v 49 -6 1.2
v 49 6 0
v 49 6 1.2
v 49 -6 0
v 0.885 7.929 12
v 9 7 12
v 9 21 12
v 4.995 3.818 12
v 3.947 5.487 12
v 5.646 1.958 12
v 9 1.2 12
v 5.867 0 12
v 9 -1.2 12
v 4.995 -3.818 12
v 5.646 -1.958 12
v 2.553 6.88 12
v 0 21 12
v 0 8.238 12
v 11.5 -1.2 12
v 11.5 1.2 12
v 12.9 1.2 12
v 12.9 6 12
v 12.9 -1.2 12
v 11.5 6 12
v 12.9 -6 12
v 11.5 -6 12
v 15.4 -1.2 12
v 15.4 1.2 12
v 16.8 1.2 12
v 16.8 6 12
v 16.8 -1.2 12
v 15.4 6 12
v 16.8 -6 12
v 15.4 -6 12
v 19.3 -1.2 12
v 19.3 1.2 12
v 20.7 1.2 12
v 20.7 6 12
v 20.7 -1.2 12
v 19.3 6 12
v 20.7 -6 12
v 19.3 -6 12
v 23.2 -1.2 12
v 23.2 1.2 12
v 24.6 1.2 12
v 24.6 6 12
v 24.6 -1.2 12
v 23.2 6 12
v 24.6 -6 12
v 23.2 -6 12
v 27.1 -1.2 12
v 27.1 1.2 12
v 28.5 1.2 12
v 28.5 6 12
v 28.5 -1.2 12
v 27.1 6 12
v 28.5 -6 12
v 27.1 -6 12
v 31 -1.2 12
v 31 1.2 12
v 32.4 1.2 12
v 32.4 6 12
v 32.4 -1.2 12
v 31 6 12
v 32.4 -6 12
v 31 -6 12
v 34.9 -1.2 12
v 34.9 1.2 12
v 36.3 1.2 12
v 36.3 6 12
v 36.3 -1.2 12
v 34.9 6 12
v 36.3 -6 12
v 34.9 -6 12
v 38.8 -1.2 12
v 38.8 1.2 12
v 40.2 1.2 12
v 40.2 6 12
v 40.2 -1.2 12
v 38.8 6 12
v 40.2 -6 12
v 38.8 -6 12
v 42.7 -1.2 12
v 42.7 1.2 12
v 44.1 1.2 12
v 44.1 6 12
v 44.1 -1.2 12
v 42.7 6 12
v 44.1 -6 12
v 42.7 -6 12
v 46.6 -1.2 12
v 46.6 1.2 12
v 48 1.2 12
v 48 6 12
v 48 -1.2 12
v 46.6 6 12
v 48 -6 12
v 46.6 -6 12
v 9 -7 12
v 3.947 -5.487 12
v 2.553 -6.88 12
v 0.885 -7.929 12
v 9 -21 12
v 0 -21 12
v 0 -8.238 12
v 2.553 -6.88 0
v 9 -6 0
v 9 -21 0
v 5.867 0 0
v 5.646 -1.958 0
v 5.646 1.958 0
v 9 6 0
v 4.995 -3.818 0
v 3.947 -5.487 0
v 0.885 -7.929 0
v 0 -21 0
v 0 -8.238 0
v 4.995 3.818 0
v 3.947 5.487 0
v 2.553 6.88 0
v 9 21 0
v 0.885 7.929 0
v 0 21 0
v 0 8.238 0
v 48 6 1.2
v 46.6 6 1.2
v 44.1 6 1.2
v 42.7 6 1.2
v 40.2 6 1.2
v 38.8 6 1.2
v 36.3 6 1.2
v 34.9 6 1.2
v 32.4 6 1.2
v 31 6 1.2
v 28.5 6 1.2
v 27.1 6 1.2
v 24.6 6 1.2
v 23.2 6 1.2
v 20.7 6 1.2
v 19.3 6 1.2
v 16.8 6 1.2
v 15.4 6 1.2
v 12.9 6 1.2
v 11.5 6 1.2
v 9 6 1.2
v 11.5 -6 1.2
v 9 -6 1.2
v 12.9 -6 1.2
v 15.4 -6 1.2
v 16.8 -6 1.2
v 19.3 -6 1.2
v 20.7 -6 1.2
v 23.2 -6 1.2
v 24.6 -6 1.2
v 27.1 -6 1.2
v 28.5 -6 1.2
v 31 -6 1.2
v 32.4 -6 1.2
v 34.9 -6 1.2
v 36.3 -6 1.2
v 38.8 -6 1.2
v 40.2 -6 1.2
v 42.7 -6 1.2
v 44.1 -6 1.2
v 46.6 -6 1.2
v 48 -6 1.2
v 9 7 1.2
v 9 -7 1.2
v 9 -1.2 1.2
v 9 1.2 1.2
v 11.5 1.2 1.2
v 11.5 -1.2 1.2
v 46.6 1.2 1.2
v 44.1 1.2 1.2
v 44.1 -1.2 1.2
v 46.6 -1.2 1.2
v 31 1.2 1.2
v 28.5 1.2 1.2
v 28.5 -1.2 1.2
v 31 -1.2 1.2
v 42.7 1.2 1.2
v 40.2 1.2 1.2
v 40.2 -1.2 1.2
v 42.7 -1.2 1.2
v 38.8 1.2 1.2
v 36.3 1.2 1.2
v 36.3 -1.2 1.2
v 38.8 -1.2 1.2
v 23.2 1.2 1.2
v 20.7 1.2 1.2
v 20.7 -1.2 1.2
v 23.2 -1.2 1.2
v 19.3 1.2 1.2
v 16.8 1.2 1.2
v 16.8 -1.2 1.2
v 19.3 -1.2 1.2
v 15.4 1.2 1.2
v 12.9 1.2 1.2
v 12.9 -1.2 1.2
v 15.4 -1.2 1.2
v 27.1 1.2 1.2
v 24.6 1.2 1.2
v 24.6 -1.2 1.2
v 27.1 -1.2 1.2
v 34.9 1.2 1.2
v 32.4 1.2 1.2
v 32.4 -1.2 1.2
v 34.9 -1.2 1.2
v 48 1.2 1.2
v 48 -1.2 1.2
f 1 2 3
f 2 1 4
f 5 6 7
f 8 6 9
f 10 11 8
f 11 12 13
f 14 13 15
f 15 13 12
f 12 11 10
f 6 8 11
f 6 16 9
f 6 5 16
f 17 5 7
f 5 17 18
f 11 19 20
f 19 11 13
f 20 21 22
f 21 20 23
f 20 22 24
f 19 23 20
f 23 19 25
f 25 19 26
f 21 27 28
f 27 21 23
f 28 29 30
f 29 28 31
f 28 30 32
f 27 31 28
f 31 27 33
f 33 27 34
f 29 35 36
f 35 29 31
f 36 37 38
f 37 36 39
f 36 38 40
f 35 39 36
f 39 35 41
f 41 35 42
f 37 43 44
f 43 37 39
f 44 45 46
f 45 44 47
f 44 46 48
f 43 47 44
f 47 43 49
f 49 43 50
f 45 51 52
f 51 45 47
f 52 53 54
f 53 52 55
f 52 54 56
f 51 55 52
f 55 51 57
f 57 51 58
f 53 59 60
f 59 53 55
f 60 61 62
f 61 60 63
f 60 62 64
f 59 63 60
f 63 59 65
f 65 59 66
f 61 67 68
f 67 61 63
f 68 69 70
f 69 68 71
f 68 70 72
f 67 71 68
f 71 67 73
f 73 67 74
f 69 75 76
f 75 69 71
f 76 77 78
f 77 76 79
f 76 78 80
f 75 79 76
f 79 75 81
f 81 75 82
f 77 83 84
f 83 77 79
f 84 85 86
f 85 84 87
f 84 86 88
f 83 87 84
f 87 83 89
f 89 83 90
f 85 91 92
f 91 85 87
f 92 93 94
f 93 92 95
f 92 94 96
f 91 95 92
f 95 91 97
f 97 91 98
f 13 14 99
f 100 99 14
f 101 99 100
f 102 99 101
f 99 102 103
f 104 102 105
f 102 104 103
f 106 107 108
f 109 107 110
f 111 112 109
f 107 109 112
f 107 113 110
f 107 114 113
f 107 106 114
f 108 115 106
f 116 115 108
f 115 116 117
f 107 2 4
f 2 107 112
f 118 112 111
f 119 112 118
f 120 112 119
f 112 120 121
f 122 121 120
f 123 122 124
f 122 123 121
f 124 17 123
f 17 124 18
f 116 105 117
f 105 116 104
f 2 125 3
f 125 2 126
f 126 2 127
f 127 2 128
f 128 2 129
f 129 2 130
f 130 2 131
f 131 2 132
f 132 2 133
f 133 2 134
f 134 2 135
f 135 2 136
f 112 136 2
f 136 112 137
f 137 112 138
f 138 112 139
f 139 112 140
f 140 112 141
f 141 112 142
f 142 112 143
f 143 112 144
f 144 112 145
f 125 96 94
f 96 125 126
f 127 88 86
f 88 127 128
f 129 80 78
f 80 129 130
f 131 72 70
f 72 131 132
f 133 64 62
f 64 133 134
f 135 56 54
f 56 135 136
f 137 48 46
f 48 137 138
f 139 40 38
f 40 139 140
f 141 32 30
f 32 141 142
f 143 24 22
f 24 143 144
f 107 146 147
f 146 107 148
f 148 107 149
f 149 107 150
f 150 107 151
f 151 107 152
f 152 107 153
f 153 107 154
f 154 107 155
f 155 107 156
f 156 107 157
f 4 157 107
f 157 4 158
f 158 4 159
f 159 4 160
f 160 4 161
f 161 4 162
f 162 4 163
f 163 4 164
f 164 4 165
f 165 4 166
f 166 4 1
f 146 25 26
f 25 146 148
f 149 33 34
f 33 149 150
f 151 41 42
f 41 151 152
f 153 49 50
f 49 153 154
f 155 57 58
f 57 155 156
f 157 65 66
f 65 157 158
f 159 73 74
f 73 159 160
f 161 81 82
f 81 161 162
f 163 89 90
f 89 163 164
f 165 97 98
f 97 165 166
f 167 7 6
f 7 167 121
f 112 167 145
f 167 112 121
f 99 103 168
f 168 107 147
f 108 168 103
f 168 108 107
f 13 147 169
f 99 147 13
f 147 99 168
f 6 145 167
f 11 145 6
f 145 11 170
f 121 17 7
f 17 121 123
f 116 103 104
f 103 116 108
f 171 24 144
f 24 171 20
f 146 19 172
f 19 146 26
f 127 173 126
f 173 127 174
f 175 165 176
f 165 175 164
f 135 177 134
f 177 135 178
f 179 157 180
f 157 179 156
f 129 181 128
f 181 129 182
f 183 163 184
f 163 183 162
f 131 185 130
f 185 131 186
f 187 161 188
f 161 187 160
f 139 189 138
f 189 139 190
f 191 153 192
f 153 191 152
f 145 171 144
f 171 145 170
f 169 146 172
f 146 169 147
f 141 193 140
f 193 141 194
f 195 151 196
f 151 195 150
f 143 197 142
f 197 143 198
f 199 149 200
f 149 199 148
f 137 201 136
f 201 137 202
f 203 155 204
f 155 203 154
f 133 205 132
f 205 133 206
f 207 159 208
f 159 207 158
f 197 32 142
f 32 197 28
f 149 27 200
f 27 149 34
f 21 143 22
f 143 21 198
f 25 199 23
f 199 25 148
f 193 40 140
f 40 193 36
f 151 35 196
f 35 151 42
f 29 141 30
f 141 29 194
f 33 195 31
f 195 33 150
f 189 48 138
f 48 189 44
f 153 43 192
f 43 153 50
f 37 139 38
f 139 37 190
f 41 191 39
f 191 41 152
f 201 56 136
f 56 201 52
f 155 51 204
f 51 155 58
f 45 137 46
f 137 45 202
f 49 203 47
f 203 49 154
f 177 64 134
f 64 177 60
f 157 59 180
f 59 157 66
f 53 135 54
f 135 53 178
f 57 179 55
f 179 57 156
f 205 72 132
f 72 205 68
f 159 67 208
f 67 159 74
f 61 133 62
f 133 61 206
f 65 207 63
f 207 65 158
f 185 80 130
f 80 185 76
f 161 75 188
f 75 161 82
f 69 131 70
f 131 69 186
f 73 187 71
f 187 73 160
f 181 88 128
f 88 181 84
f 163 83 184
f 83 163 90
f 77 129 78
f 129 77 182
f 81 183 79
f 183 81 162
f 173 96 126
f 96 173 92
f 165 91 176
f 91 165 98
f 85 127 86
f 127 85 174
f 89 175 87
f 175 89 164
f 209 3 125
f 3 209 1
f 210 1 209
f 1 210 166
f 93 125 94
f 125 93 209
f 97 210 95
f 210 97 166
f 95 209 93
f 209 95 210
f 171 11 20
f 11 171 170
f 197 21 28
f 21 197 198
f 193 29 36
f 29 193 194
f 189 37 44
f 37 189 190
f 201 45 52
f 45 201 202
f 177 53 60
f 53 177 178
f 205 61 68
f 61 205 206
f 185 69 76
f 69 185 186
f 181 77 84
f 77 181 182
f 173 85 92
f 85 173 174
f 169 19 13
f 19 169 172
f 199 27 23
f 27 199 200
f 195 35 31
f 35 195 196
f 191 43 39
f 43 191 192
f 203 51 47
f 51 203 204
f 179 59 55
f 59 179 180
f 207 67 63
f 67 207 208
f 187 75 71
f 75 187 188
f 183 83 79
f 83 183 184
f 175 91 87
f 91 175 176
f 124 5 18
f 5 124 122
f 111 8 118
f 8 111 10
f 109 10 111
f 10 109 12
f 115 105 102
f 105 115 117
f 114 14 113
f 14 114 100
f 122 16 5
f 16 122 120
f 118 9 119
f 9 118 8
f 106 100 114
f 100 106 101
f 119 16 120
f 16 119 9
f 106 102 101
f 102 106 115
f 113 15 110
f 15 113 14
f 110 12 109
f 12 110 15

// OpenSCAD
length  = 49;
slength = 9;
width   = 42;
swidth  = 12;
heigth  = 12;
diam    = 17.6;

// garden row
mittfora = 2.4;
gs = 1.4;
gr = 2.5;
gh = 1.2;

difference()
{
    union()
    {
        translate([0,-swidth/2,0])cube([length, swidth, heigth]);
        translate([0,-width/2,0])cube([slength, width, heigth]);
    }
    translate([-(diam/6),0,-1])cylinder(h=heigth+2, r=diam/2);
    union()
    {
    translate([slength,0,gh])
        difference()
        {
            union()
            {
                for(i=[0:gr+gs:length-slength])
                {
                    translate([i,-1-(swidth/2),0])cube([gr,swidth+2,heigth]);
                }
            }
            translate([0,-mittfora/2,0])cube([length-slength-1, mittfora, heigth]);
        }
    }
}
